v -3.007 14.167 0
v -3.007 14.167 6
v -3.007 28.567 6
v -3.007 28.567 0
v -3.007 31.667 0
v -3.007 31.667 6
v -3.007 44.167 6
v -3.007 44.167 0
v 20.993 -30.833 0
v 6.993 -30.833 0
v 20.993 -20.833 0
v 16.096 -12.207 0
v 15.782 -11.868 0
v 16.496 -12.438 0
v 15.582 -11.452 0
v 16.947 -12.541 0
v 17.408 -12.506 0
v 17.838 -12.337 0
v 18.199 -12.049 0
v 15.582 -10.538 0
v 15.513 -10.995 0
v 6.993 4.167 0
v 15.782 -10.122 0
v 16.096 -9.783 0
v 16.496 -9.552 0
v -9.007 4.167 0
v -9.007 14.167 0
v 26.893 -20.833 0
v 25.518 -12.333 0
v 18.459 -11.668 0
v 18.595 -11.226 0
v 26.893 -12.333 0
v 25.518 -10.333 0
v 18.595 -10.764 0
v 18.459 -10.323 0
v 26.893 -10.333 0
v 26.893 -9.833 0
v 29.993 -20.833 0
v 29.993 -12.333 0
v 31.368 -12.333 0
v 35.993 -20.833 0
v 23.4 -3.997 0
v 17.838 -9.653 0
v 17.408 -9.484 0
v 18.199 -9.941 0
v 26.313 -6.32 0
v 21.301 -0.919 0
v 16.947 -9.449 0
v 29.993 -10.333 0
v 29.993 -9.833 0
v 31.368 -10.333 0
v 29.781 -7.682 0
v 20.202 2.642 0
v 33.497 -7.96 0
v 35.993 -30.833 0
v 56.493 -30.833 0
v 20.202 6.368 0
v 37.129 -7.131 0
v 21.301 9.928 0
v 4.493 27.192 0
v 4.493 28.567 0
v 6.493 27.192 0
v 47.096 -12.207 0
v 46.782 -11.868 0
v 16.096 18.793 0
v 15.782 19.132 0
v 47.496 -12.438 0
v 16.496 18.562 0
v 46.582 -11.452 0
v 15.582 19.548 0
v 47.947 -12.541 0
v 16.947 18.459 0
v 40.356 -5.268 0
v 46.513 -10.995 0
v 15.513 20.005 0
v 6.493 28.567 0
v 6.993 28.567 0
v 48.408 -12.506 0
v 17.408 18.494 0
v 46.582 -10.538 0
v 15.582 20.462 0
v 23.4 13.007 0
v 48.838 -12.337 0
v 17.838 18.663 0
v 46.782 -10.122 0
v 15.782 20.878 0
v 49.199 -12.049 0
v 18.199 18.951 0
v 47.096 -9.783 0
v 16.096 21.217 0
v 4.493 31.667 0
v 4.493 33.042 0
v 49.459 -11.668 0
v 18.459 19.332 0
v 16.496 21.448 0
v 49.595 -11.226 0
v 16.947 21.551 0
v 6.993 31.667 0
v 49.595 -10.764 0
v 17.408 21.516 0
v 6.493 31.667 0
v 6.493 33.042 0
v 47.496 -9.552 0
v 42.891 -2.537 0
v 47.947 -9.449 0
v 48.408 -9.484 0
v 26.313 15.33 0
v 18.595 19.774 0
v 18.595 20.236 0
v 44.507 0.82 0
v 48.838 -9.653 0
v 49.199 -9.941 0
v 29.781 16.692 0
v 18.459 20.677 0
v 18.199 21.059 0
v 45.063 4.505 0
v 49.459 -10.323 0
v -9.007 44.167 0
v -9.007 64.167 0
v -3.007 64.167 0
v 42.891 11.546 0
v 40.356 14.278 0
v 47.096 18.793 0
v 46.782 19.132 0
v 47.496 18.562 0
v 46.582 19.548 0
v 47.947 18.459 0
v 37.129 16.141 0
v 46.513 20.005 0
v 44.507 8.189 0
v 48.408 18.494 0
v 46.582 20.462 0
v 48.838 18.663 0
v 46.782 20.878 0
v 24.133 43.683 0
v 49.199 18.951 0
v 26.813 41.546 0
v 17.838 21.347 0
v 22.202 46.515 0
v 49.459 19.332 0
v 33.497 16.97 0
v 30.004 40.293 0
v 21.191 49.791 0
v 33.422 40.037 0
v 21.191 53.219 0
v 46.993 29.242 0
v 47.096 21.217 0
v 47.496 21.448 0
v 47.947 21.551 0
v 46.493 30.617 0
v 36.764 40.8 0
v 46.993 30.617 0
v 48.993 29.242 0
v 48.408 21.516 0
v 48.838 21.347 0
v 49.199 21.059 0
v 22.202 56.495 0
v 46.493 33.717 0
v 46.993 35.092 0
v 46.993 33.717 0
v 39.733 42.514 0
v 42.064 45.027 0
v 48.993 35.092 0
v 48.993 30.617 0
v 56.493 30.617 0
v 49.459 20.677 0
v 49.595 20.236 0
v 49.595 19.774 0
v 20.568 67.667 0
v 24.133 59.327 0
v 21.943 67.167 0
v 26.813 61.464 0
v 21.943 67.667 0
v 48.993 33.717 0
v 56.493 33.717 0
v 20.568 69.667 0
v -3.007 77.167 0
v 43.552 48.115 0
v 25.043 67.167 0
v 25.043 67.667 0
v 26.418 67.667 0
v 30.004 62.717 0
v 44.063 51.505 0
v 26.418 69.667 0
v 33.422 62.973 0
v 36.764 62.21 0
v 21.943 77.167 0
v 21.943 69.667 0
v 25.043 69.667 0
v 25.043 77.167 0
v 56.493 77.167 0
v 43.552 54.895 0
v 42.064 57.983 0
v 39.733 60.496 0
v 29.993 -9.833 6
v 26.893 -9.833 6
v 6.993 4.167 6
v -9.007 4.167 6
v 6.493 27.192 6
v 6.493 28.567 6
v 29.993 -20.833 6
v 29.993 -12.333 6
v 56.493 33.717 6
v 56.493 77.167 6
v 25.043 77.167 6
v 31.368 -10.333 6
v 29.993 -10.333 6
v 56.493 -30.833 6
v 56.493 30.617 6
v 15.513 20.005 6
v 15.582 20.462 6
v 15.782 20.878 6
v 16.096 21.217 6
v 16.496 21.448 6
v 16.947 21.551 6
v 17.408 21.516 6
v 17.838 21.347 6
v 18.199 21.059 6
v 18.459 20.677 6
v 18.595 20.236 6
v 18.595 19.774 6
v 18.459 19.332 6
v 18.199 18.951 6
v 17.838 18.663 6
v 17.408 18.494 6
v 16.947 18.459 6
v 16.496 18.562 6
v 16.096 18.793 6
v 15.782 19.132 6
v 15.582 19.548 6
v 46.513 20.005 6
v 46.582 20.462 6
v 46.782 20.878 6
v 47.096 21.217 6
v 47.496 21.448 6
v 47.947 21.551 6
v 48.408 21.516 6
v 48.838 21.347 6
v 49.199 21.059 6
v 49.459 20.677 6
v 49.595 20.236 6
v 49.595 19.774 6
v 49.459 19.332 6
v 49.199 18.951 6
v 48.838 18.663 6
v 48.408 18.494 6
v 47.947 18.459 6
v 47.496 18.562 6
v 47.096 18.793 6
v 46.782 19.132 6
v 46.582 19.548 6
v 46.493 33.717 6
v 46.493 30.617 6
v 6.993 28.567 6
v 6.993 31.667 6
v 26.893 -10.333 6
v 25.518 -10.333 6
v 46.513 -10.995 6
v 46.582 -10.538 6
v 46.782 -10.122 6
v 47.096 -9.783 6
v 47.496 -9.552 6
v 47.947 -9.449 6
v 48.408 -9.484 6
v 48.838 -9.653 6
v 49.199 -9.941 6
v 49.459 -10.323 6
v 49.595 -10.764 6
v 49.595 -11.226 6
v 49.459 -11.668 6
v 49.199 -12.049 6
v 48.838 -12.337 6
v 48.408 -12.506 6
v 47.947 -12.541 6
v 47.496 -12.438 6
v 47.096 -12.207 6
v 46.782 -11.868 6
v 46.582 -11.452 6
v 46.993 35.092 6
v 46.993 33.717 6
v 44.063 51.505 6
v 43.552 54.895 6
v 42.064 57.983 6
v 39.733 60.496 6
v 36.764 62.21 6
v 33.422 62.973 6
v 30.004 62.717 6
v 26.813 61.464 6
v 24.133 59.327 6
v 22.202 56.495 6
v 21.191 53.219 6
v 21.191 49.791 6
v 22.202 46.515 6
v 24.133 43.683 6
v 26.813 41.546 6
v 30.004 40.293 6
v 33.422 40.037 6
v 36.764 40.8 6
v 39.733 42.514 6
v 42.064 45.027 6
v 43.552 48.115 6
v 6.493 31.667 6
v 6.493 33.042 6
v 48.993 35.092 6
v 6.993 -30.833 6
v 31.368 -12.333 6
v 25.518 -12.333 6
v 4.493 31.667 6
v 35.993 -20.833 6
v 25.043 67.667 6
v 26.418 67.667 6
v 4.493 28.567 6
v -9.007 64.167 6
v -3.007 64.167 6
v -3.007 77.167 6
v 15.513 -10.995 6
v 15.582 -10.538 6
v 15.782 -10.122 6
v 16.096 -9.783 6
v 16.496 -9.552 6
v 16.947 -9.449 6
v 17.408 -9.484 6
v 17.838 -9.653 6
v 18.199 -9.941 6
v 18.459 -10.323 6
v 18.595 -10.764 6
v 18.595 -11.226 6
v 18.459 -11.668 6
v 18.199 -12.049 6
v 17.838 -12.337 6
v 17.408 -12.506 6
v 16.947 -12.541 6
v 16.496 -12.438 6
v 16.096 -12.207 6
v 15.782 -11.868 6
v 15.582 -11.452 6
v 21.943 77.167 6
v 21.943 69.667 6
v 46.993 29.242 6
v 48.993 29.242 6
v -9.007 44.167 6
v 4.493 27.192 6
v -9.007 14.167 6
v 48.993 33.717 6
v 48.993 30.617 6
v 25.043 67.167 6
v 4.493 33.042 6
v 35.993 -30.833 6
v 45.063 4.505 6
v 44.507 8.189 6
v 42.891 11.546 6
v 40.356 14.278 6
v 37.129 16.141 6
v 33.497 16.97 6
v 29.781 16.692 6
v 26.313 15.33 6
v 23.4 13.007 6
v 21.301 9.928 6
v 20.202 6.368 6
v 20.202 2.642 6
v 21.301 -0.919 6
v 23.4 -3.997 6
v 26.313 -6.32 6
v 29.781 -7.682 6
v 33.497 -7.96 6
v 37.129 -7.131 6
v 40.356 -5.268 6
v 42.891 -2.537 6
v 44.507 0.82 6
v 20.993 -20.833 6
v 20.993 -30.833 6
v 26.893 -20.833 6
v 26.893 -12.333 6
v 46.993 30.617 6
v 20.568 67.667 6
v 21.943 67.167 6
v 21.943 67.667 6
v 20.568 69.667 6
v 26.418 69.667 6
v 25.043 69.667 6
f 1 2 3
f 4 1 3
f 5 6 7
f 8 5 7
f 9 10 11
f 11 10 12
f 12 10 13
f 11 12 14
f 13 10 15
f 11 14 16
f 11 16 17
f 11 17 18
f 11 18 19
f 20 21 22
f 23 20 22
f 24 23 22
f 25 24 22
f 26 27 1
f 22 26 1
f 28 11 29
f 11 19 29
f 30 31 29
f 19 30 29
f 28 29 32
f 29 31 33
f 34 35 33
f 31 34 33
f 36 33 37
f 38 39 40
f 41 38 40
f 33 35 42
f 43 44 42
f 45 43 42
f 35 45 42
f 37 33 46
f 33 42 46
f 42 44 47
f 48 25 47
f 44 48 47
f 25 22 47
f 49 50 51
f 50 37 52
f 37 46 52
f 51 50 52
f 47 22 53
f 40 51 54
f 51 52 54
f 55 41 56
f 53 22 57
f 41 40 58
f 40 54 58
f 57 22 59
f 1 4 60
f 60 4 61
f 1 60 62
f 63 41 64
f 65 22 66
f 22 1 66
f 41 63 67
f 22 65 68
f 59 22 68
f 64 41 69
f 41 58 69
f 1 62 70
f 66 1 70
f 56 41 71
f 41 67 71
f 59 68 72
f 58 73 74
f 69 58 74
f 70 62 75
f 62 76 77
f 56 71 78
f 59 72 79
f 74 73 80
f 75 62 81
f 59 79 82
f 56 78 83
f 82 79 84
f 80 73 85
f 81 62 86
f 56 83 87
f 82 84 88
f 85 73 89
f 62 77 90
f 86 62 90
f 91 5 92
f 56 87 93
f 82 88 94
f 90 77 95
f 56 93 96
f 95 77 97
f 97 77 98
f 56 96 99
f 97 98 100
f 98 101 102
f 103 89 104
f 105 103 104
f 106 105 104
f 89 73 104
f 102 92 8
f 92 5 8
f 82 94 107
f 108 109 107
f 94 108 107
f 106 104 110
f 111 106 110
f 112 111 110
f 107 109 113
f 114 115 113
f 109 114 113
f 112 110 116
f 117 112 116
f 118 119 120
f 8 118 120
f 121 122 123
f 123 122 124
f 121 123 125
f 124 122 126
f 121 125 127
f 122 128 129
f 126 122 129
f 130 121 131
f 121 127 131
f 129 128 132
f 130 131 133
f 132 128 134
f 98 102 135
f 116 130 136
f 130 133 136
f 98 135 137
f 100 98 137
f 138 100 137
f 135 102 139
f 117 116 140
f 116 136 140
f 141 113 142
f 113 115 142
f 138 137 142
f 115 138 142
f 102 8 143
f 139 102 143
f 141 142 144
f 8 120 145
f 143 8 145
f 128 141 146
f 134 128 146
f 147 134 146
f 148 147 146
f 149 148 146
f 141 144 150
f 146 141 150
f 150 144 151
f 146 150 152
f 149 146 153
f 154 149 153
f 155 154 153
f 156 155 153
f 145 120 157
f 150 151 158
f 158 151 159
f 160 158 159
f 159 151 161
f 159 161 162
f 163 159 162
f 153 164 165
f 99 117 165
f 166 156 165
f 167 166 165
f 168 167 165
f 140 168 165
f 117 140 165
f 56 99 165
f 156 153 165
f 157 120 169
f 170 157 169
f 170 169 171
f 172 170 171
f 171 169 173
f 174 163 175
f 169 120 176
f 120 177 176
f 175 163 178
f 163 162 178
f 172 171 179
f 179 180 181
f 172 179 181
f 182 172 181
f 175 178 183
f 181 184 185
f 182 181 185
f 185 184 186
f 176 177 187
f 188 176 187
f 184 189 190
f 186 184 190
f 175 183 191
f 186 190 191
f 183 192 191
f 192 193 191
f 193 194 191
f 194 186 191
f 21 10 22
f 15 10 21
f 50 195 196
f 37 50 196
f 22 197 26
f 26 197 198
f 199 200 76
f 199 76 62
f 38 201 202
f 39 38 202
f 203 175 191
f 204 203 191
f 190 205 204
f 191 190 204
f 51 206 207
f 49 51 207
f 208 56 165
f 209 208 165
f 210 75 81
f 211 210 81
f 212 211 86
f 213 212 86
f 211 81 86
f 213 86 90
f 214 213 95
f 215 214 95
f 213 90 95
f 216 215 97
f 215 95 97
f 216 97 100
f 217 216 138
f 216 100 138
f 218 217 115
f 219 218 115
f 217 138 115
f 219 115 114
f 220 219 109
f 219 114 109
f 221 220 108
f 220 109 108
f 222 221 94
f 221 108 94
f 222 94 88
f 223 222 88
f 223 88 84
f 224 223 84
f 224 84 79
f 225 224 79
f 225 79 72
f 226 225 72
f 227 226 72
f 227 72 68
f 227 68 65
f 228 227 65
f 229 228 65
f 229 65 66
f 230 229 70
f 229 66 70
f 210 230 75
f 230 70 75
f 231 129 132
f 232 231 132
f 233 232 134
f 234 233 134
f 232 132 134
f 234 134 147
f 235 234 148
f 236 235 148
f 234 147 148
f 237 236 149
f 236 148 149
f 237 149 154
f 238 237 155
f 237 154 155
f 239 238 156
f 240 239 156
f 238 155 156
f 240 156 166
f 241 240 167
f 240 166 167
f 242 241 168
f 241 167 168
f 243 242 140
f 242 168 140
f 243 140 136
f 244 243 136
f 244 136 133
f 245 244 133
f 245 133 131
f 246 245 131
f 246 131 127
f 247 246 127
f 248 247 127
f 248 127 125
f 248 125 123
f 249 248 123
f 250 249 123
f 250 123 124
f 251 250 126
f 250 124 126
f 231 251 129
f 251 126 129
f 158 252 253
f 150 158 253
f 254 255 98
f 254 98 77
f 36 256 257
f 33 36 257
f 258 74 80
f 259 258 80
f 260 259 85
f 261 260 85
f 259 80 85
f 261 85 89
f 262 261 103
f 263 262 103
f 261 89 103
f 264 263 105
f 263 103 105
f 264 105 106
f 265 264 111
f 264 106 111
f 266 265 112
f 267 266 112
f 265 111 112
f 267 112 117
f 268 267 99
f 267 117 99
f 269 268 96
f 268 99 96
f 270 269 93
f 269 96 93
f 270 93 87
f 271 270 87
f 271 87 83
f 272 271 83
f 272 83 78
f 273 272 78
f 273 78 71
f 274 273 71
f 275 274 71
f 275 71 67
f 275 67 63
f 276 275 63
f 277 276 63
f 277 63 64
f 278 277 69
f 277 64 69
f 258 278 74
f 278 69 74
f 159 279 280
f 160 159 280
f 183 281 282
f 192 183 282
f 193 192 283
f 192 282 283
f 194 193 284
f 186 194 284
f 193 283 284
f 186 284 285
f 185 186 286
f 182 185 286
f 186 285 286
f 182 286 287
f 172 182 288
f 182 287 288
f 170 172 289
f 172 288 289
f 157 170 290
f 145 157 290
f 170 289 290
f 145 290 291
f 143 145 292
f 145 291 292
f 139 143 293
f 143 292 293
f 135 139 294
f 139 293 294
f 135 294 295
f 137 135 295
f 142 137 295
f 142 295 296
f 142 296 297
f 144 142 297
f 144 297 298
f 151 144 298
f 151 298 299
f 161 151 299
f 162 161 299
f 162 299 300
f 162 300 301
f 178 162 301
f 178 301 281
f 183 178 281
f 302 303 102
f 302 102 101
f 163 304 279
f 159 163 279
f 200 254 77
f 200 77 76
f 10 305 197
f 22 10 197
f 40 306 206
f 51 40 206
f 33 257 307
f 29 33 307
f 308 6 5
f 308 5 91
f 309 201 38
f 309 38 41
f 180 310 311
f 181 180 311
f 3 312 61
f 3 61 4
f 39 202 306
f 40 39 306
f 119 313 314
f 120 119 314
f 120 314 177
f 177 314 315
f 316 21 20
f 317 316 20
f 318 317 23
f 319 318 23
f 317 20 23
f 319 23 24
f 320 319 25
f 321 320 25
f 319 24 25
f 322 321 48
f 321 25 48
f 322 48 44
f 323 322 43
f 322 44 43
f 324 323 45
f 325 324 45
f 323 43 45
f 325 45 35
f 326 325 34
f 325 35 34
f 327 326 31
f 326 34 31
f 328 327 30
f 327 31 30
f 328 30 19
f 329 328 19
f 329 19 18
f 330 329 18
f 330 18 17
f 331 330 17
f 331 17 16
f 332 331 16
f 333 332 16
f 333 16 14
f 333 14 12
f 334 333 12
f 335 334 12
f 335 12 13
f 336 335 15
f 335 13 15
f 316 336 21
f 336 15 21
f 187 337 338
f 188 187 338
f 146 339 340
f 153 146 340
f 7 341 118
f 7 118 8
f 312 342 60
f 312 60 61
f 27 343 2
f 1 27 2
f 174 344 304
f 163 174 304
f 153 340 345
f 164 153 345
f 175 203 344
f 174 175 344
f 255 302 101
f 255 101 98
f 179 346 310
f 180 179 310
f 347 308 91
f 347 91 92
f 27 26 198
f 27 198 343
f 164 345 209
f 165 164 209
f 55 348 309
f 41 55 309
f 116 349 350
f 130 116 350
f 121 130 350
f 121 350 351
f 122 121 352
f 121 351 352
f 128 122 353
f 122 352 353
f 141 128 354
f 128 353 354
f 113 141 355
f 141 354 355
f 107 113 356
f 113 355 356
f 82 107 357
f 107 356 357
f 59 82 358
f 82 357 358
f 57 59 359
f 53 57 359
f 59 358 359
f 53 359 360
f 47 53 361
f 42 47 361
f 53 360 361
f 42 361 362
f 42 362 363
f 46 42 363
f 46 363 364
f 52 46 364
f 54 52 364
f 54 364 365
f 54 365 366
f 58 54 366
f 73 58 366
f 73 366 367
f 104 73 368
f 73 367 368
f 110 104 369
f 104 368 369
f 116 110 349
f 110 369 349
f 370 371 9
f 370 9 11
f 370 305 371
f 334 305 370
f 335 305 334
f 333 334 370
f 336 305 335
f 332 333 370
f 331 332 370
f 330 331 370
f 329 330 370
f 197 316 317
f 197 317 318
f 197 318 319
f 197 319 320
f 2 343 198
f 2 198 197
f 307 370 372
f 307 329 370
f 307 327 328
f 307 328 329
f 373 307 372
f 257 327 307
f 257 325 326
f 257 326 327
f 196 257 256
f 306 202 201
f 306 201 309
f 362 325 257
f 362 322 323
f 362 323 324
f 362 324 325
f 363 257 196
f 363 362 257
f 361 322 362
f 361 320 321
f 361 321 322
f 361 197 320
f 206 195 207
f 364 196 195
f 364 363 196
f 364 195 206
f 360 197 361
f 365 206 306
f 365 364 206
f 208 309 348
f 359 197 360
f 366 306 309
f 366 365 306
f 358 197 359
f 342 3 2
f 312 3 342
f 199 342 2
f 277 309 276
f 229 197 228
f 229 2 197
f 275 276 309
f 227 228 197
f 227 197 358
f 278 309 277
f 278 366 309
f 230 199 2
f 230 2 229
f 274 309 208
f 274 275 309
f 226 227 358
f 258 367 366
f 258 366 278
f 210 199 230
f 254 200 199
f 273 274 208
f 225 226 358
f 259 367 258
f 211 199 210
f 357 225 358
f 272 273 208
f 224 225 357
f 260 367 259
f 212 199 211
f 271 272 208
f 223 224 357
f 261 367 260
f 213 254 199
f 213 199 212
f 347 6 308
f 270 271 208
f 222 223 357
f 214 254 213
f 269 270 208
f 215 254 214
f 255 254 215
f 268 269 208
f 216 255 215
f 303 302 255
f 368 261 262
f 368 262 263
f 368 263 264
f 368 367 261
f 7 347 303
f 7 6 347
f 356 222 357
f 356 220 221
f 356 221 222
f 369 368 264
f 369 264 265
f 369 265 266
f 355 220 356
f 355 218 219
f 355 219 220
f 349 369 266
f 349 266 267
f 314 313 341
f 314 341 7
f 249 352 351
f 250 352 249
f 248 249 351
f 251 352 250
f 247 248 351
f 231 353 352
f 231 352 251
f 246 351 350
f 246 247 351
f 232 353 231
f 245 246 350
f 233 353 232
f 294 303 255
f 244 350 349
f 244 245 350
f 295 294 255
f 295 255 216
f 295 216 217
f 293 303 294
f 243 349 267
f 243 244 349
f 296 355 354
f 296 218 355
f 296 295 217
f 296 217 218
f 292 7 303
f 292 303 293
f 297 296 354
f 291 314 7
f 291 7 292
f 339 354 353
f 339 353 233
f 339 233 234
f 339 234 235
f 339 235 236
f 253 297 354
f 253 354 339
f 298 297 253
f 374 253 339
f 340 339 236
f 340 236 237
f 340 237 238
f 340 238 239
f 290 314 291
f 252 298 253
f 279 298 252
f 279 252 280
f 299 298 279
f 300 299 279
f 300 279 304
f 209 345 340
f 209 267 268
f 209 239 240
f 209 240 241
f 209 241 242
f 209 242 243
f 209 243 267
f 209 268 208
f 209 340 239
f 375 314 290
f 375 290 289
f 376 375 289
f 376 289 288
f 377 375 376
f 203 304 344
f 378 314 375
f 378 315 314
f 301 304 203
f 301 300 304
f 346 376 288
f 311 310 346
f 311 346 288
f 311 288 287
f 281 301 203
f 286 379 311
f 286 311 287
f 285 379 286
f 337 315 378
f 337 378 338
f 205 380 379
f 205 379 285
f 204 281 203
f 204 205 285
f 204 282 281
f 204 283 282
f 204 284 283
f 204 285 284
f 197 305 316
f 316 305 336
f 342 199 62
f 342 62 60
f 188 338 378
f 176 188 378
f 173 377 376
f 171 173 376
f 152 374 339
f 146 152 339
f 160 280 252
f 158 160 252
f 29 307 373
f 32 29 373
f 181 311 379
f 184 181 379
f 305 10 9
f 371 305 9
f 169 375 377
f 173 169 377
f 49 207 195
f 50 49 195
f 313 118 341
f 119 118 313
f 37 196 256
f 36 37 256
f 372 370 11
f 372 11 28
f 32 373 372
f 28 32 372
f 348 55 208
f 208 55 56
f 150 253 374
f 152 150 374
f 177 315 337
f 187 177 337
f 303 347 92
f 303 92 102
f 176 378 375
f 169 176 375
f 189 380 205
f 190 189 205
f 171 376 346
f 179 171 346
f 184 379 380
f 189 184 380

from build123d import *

# Parameters (mm, degrees)
SZKIC1_W                    = 65.5
SZKIC1_H                    = 114
DODANIE_WYCI_GNI_CIE1_DEPTH = 6
SZKIC2_R                    = 12.5
WYTNIJ_WYCI_GNI_CIE2_DEPTH  = 6
SZKIC4_R                    = 1.55
WYTNIJ_WYCI_GNI_CIE3_DEPTH  = 6
SZKIC5_W                    = 15
SZKIC5_H                    = 10
SZKIC5_W_2                  = 6
SZKIC5_H_2                  = 30
WYTNIJ_WYCI_GNI_CIE4_DEPTH  = 6
WYTNIJ_WYCI_GNI_CIE5_DEPTH  = 6
WYTNIJ_WYCI_GNI_CIE6_DEPTH  = 6
SZKIC8_R                    = 11.5
WYTNIJ_WYCI_GNI_CIE7_DEPTH  = 10


with BuildPart() as part:
    # Szkic1 → Dodanie-wyciągnięcie1 (new body)
    with BuildSketch(Plane.XY):
        with Locations((23.742718173, 26.167032616)):
            Rectangle(SZKIC1_W, SZKIC1_H)
    extrude(amount=DODANIE_WYCI_GNI_CIE1_DEPTH)

    # Szkic2 → Wytnij-wyciągnięcie2 (cut)
    with BuildSketch(Plane.XY.offset(6)):
        with Locations((32.562718173, 4.504913836)):
            Circle(SZKIC2_R)
    extrude(amount=-WYTNIJ_WYCI_GNI_CIE2_DEPTH, mode=Mode.SUBTRACT)

    # Szkic4 → Wytnij-wyciągnięcie3 (cut)
    with BuildSketch(Plane(origin=(0, 0, 0), x_dir=(-1, 0, 0), z_dir=(0, 0, -1))):
        with Locations((-17.062718173, -10.995086164)):
            Circle(SZKIC4_R)
        with Locations((-17.062718173, 20.004913836)):
            Circle(SZKIC4_R)
        with Locations((-48.062718173, 20.004913836)):
            Circle(SZKIC4_R)
        with Locations((-48.062718173, -10.995086164)):
            Circle(SZKIC4_R)
    extrude(amount=-WYTNIJ_WYCI_GNI_CIE3_DEPTH, mode=Mode.SUBTRACT)

    # Szkic5 → Wytnij-wyciągnięcie4 (cut)
    with BuildSketch(Plane.XY.offset(6)):
        Polygon((-9.007281827, 4.167032616), (-9.007281827, -30.832967384), (6.992718173, -30.832967384), (6.992718173, 4.167032616), (-3.007281827, 4.167032616), align=None)
        with Locations((28.492718173, -25.832967384)):
            Rectangle(SZKIC5_W, SZKIC5_H)
        Polygon((56.492718173, 77.167032616), (56.492718173, 83.167032616), (-9.007281827, 83.167032616), (-9.007281827, 64.167032616), (-3.007281827, 64.167032616), (-3.007281827, 77.167032616), align=None)
        with Locations((-6.007281827, 29.167032616)):
            Rectangle(SZKIC5_W_2, SZKIC5_H_2)
    extrude(amount=-WYTNIJ_WYCI_GNI_CIE4_DEPTH, mode=Mode.SUBTRACT)

    # Szkic6 → Wytnij-wyciągnięcie5 (cut)
    with BuildSketch(Plane.XY.offset(6)):
        Polygon((-3.007281827, 31.667032616), (4.492718173, 31.667032616), (4.492718173, 33.042032616), (6.492718173, 33.042032616), (6.492718173, 31.667032616), (6.992718173, 31.667032616), (6.992718173, 28.567032616), (6.492718173, 28.567032616), (6.492718173, 27.192032616), (4.492718173, 27.192032616), (4.492718173, 28.567032616), (-3.007281827, 28.567032616), align=None)
        Polygon((26.892718173, -20.832967384), (29.992718173, -20.832967384), (29.992718173, -12.332967384), (31.367718173, -12.332967384), (31.367718173, -10.332967384), (29.992718173, -10.332967384), (29.992718173, -9.832967384), (26.892718173, -9.832967384), (26.892718173, -10.332967384), (25.517718173, -10.332967384), (25.517718173, -12.332967384), (26.892718173, -12.332967384), align=None)
    extrude(amount=-WYTNIJ_WYCI_GNI_CIE5_DEPTH, mode=Mode.SUBTRACT)

    # Szkic7 → Wytnij-wyciągnięcie6 (cut)
    with BuildSketch(Plane.XY.offset(6)):
        Polygon((56.492718173, 33.717032616), (48.992718173, 33.717032616), (48.992718173, 35.092032616), (46.992718173, 35.092032616), (46.992718173, 33.717032616), (46.492718173, 33.717032616), (46.492718173, 30.617032616), (46.992718173, 30.617032616), (46.992718173, 29.242032616), (48.992718173, 29.242032616), (48.992718173, 30.617032616), (56.492718173, 30.617032616), align=None)
        Polygon((21.942718173, 69.667032616), (20.567718173, 69.667032616), (20.567718173, 67.667032616), (21.942718173, 67.667032616), (21.942718173, 67.167032616), (25.042718173, 67.167032616), (25.042718173, 67.667032616), (26.417718173, 67.667032616), (26.417718173, 69.667032616), (25.042718173, 69.667032616), (25.042718173, 77.167032616), (21.942718173, 77.167032616), align=None)
    extrude(amount=-WYTNIJ_WYCI_GNI_CIE6_DEPTH, mode=Mode.SUBTRACT)

    # Szkic8 → Wytnij-wyciągnięcie7 (cut)
    with BuildSketch(Plane.XY.offset(6)):
        with Locations((32.562718173, 51.504913836)):
            Circle(SZKIC8_R)
    extrude(amount=-WYTNIJ_WYCI_GNI_CIE7_DEPTH, mode=Mode.SUBTRACT)


solid = part.part
